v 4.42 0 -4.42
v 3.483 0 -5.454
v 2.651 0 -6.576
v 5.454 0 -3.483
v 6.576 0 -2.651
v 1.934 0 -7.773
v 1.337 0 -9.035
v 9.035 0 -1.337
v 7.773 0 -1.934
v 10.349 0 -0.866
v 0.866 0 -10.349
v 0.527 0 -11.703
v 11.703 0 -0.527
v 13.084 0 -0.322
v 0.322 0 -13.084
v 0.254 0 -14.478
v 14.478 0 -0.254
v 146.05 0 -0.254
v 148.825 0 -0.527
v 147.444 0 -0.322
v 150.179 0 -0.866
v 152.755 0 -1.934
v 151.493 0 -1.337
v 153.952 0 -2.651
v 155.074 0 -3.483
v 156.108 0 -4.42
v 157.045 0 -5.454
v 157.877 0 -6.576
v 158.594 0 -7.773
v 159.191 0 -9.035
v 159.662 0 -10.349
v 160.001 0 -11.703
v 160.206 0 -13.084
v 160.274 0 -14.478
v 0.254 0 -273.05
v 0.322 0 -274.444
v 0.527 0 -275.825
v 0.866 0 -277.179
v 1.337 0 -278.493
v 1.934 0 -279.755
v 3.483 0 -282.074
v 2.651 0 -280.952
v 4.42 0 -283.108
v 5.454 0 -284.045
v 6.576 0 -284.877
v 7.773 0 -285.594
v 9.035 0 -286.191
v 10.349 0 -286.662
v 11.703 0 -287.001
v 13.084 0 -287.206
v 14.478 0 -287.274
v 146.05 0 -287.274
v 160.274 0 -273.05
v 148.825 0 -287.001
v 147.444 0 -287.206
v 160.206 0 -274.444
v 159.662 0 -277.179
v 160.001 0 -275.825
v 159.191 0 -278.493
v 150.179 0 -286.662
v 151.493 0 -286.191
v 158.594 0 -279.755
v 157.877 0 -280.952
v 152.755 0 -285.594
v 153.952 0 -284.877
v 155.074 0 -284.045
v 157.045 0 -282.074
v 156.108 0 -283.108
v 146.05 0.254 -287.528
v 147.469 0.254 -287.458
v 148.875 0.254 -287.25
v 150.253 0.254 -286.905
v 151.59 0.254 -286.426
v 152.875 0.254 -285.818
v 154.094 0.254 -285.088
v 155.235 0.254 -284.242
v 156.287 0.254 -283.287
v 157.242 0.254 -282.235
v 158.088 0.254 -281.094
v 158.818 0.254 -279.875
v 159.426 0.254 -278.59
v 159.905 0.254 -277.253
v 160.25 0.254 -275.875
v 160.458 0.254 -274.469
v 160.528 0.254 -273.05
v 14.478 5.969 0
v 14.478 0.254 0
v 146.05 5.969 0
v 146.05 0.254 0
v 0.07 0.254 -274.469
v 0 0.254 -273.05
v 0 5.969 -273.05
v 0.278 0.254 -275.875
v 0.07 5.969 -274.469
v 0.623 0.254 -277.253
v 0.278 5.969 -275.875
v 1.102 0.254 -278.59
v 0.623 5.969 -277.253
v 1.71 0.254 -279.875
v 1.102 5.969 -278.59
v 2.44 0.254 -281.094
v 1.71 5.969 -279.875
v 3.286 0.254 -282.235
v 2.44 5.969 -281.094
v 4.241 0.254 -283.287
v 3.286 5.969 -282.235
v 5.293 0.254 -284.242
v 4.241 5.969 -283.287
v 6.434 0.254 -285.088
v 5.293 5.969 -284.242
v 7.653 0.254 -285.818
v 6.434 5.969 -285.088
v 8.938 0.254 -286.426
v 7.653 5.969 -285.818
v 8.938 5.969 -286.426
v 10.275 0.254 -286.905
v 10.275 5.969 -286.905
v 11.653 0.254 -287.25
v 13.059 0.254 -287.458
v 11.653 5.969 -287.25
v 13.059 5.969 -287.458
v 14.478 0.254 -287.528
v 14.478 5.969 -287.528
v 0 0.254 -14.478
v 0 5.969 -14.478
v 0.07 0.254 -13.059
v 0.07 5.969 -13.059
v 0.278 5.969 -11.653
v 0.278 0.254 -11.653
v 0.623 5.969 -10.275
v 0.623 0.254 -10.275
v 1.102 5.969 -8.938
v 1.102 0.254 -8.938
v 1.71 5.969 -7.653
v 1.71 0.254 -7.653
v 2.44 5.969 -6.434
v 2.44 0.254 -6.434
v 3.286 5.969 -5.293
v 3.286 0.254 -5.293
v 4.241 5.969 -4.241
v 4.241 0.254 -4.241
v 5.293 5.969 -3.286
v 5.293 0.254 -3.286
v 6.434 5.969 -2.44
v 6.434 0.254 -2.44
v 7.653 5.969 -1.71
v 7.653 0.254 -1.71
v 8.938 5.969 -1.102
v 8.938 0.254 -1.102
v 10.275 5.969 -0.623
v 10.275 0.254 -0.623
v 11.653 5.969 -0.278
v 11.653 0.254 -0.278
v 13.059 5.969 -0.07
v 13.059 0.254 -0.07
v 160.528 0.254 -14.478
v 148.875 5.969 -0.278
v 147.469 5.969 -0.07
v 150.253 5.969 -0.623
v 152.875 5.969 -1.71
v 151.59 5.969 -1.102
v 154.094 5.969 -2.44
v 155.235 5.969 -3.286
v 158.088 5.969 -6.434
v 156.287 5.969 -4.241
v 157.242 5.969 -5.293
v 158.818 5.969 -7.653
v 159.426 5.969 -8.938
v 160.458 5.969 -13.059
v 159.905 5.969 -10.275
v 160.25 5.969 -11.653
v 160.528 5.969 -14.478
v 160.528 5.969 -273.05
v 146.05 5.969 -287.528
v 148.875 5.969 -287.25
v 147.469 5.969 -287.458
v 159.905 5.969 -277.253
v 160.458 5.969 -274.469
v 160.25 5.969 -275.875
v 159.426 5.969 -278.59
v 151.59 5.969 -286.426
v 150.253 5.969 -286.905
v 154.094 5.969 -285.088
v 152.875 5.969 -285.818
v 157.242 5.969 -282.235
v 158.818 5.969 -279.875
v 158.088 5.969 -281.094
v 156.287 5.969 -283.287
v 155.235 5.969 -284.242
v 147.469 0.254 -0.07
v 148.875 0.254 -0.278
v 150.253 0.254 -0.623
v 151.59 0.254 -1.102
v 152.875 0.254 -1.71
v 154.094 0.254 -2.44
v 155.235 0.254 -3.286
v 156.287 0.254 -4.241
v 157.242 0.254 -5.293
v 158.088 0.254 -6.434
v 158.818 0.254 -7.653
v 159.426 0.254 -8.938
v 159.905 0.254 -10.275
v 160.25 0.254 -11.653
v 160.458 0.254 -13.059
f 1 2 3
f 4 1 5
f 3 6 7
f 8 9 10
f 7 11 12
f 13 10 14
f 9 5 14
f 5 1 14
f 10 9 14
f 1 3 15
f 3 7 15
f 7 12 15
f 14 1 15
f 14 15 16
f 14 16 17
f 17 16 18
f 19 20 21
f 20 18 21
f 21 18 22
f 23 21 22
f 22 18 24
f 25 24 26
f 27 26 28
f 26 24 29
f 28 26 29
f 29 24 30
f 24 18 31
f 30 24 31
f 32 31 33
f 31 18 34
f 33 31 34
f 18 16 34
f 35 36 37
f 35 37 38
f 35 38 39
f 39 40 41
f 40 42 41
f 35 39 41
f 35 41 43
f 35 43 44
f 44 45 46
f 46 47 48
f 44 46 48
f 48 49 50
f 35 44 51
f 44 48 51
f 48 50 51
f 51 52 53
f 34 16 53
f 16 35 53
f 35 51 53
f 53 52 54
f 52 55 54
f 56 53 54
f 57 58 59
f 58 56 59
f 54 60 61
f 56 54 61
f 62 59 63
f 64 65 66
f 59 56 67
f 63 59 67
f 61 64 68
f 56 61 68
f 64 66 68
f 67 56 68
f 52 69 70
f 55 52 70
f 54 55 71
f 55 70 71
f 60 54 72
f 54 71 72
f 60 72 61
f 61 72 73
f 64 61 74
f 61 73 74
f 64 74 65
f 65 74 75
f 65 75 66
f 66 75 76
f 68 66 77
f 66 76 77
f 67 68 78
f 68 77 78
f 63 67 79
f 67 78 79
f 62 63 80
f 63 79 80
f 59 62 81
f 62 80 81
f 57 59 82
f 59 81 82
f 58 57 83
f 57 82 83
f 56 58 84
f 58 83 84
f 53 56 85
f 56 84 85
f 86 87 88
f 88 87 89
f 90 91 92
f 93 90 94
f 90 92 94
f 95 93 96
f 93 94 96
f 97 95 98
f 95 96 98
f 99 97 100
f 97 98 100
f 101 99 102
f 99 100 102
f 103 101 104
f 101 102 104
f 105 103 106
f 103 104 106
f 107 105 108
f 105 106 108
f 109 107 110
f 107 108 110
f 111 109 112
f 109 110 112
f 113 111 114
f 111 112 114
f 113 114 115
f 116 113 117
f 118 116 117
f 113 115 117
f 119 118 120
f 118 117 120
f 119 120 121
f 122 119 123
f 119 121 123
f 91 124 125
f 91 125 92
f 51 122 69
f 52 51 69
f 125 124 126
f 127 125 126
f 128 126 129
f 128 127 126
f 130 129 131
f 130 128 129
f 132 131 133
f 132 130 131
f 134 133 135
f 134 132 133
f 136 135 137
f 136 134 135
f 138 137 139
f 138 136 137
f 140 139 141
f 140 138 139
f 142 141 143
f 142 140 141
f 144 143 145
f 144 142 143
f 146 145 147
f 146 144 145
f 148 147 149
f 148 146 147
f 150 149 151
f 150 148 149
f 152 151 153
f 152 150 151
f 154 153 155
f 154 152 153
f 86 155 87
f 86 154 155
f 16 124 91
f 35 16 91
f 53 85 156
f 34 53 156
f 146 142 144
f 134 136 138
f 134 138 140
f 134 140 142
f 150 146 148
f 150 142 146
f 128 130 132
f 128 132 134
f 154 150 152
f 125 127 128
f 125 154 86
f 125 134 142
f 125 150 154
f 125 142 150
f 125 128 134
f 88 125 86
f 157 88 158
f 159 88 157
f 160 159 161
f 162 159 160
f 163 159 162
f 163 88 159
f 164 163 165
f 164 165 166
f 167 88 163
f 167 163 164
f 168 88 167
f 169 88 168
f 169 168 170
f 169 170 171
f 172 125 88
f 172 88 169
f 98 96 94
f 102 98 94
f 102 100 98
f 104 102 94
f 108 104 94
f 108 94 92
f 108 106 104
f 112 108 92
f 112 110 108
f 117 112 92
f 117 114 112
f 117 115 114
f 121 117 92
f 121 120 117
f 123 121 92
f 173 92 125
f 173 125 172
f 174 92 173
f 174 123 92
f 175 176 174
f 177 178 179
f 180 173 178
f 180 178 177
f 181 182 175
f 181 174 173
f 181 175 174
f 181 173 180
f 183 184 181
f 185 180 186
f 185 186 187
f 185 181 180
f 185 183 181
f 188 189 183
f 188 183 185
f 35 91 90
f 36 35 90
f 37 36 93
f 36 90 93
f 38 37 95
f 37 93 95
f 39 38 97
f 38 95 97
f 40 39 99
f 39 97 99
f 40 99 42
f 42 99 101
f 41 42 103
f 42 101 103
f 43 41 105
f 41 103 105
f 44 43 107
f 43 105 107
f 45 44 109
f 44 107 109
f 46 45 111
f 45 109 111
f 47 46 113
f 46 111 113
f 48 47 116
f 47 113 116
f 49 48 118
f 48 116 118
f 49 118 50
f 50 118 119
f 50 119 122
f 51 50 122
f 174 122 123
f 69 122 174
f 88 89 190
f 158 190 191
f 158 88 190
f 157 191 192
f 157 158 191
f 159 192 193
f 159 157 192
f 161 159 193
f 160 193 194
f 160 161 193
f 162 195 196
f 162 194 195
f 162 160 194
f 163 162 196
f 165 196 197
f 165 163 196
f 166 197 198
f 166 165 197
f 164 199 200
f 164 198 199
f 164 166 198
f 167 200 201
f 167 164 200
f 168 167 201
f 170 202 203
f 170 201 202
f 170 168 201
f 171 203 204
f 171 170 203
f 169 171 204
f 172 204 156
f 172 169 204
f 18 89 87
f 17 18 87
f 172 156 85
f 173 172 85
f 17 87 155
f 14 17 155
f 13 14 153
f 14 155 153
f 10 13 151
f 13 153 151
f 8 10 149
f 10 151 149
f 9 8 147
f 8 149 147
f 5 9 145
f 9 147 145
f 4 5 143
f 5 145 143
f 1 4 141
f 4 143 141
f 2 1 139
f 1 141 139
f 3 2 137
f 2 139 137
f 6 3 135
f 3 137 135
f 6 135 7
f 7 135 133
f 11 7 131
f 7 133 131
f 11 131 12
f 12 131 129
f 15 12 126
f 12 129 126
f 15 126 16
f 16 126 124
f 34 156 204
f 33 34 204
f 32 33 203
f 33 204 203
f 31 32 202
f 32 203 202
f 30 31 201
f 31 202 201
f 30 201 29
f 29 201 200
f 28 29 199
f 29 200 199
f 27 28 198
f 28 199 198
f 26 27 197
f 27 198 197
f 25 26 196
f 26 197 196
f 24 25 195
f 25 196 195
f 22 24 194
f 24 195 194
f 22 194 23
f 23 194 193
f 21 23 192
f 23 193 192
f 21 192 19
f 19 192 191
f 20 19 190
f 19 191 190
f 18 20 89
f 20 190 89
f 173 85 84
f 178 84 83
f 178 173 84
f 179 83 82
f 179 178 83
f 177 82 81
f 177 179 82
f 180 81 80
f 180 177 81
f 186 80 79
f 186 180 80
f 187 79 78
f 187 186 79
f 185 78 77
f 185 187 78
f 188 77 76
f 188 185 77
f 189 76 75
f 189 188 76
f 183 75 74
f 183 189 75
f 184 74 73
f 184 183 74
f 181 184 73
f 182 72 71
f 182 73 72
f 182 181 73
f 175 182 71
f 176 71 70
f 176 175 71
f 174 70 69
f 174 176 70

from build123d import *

# Parameters (mm, degrees)
SKETCH1_W           = 160.528
SKETCH1_H           = 287.528
BOSS_EXTRUDE1_DEPTH = 5.969
FILLET2_R           = 14.478
CHAMFER1_SIZE       = 0.254


with BuildPart() as part:
    # Sketch1 → Boss-Extrude1 (new body)
    with BuildSketch(Plane(origin=(0, 0, 0), x_dir=(1, 0, 0), z_dir=(0, 1, 0))):
        with Locations((80.264, 143.764)):
            Rectangle(SKETCH1_W, SKETCH1_H)
    extrude(amount=BOSS_EXTRUDE1_DEPTH)

    # Fillet2
    fillet2_edges = [part.edges().sort_by_distance(p)[0] for p in [
        (0, 2.9845, -287.528),
        (160.528, 2.9845, -287.528),
        (160.528, 2.9845, 0),
        (0, 2.9845, 0),
    ]]
    fillet(fillet2_edges, radius=FILLET2_R)

    # Chamfer1
    chamfer1_edges = [part.edges().sort_by_distance(p)[0] for p in [
        (80.264, 0, -287.528),
        (0, 0, -143.764),
        (160.528, 0, -143.764),
        (80.264, 0, 0),
        (4.240508022, 0, -283.287491978),
        (4.240508022, 0, -4.240508022),
        (156.287491978, 0, -4.240508022),
        (156.287491978, 0, -283.287491978),
    ]]
    chamfer(chamfer1_edges, length=CHAMFER1_SIZE)


solid = part.part
